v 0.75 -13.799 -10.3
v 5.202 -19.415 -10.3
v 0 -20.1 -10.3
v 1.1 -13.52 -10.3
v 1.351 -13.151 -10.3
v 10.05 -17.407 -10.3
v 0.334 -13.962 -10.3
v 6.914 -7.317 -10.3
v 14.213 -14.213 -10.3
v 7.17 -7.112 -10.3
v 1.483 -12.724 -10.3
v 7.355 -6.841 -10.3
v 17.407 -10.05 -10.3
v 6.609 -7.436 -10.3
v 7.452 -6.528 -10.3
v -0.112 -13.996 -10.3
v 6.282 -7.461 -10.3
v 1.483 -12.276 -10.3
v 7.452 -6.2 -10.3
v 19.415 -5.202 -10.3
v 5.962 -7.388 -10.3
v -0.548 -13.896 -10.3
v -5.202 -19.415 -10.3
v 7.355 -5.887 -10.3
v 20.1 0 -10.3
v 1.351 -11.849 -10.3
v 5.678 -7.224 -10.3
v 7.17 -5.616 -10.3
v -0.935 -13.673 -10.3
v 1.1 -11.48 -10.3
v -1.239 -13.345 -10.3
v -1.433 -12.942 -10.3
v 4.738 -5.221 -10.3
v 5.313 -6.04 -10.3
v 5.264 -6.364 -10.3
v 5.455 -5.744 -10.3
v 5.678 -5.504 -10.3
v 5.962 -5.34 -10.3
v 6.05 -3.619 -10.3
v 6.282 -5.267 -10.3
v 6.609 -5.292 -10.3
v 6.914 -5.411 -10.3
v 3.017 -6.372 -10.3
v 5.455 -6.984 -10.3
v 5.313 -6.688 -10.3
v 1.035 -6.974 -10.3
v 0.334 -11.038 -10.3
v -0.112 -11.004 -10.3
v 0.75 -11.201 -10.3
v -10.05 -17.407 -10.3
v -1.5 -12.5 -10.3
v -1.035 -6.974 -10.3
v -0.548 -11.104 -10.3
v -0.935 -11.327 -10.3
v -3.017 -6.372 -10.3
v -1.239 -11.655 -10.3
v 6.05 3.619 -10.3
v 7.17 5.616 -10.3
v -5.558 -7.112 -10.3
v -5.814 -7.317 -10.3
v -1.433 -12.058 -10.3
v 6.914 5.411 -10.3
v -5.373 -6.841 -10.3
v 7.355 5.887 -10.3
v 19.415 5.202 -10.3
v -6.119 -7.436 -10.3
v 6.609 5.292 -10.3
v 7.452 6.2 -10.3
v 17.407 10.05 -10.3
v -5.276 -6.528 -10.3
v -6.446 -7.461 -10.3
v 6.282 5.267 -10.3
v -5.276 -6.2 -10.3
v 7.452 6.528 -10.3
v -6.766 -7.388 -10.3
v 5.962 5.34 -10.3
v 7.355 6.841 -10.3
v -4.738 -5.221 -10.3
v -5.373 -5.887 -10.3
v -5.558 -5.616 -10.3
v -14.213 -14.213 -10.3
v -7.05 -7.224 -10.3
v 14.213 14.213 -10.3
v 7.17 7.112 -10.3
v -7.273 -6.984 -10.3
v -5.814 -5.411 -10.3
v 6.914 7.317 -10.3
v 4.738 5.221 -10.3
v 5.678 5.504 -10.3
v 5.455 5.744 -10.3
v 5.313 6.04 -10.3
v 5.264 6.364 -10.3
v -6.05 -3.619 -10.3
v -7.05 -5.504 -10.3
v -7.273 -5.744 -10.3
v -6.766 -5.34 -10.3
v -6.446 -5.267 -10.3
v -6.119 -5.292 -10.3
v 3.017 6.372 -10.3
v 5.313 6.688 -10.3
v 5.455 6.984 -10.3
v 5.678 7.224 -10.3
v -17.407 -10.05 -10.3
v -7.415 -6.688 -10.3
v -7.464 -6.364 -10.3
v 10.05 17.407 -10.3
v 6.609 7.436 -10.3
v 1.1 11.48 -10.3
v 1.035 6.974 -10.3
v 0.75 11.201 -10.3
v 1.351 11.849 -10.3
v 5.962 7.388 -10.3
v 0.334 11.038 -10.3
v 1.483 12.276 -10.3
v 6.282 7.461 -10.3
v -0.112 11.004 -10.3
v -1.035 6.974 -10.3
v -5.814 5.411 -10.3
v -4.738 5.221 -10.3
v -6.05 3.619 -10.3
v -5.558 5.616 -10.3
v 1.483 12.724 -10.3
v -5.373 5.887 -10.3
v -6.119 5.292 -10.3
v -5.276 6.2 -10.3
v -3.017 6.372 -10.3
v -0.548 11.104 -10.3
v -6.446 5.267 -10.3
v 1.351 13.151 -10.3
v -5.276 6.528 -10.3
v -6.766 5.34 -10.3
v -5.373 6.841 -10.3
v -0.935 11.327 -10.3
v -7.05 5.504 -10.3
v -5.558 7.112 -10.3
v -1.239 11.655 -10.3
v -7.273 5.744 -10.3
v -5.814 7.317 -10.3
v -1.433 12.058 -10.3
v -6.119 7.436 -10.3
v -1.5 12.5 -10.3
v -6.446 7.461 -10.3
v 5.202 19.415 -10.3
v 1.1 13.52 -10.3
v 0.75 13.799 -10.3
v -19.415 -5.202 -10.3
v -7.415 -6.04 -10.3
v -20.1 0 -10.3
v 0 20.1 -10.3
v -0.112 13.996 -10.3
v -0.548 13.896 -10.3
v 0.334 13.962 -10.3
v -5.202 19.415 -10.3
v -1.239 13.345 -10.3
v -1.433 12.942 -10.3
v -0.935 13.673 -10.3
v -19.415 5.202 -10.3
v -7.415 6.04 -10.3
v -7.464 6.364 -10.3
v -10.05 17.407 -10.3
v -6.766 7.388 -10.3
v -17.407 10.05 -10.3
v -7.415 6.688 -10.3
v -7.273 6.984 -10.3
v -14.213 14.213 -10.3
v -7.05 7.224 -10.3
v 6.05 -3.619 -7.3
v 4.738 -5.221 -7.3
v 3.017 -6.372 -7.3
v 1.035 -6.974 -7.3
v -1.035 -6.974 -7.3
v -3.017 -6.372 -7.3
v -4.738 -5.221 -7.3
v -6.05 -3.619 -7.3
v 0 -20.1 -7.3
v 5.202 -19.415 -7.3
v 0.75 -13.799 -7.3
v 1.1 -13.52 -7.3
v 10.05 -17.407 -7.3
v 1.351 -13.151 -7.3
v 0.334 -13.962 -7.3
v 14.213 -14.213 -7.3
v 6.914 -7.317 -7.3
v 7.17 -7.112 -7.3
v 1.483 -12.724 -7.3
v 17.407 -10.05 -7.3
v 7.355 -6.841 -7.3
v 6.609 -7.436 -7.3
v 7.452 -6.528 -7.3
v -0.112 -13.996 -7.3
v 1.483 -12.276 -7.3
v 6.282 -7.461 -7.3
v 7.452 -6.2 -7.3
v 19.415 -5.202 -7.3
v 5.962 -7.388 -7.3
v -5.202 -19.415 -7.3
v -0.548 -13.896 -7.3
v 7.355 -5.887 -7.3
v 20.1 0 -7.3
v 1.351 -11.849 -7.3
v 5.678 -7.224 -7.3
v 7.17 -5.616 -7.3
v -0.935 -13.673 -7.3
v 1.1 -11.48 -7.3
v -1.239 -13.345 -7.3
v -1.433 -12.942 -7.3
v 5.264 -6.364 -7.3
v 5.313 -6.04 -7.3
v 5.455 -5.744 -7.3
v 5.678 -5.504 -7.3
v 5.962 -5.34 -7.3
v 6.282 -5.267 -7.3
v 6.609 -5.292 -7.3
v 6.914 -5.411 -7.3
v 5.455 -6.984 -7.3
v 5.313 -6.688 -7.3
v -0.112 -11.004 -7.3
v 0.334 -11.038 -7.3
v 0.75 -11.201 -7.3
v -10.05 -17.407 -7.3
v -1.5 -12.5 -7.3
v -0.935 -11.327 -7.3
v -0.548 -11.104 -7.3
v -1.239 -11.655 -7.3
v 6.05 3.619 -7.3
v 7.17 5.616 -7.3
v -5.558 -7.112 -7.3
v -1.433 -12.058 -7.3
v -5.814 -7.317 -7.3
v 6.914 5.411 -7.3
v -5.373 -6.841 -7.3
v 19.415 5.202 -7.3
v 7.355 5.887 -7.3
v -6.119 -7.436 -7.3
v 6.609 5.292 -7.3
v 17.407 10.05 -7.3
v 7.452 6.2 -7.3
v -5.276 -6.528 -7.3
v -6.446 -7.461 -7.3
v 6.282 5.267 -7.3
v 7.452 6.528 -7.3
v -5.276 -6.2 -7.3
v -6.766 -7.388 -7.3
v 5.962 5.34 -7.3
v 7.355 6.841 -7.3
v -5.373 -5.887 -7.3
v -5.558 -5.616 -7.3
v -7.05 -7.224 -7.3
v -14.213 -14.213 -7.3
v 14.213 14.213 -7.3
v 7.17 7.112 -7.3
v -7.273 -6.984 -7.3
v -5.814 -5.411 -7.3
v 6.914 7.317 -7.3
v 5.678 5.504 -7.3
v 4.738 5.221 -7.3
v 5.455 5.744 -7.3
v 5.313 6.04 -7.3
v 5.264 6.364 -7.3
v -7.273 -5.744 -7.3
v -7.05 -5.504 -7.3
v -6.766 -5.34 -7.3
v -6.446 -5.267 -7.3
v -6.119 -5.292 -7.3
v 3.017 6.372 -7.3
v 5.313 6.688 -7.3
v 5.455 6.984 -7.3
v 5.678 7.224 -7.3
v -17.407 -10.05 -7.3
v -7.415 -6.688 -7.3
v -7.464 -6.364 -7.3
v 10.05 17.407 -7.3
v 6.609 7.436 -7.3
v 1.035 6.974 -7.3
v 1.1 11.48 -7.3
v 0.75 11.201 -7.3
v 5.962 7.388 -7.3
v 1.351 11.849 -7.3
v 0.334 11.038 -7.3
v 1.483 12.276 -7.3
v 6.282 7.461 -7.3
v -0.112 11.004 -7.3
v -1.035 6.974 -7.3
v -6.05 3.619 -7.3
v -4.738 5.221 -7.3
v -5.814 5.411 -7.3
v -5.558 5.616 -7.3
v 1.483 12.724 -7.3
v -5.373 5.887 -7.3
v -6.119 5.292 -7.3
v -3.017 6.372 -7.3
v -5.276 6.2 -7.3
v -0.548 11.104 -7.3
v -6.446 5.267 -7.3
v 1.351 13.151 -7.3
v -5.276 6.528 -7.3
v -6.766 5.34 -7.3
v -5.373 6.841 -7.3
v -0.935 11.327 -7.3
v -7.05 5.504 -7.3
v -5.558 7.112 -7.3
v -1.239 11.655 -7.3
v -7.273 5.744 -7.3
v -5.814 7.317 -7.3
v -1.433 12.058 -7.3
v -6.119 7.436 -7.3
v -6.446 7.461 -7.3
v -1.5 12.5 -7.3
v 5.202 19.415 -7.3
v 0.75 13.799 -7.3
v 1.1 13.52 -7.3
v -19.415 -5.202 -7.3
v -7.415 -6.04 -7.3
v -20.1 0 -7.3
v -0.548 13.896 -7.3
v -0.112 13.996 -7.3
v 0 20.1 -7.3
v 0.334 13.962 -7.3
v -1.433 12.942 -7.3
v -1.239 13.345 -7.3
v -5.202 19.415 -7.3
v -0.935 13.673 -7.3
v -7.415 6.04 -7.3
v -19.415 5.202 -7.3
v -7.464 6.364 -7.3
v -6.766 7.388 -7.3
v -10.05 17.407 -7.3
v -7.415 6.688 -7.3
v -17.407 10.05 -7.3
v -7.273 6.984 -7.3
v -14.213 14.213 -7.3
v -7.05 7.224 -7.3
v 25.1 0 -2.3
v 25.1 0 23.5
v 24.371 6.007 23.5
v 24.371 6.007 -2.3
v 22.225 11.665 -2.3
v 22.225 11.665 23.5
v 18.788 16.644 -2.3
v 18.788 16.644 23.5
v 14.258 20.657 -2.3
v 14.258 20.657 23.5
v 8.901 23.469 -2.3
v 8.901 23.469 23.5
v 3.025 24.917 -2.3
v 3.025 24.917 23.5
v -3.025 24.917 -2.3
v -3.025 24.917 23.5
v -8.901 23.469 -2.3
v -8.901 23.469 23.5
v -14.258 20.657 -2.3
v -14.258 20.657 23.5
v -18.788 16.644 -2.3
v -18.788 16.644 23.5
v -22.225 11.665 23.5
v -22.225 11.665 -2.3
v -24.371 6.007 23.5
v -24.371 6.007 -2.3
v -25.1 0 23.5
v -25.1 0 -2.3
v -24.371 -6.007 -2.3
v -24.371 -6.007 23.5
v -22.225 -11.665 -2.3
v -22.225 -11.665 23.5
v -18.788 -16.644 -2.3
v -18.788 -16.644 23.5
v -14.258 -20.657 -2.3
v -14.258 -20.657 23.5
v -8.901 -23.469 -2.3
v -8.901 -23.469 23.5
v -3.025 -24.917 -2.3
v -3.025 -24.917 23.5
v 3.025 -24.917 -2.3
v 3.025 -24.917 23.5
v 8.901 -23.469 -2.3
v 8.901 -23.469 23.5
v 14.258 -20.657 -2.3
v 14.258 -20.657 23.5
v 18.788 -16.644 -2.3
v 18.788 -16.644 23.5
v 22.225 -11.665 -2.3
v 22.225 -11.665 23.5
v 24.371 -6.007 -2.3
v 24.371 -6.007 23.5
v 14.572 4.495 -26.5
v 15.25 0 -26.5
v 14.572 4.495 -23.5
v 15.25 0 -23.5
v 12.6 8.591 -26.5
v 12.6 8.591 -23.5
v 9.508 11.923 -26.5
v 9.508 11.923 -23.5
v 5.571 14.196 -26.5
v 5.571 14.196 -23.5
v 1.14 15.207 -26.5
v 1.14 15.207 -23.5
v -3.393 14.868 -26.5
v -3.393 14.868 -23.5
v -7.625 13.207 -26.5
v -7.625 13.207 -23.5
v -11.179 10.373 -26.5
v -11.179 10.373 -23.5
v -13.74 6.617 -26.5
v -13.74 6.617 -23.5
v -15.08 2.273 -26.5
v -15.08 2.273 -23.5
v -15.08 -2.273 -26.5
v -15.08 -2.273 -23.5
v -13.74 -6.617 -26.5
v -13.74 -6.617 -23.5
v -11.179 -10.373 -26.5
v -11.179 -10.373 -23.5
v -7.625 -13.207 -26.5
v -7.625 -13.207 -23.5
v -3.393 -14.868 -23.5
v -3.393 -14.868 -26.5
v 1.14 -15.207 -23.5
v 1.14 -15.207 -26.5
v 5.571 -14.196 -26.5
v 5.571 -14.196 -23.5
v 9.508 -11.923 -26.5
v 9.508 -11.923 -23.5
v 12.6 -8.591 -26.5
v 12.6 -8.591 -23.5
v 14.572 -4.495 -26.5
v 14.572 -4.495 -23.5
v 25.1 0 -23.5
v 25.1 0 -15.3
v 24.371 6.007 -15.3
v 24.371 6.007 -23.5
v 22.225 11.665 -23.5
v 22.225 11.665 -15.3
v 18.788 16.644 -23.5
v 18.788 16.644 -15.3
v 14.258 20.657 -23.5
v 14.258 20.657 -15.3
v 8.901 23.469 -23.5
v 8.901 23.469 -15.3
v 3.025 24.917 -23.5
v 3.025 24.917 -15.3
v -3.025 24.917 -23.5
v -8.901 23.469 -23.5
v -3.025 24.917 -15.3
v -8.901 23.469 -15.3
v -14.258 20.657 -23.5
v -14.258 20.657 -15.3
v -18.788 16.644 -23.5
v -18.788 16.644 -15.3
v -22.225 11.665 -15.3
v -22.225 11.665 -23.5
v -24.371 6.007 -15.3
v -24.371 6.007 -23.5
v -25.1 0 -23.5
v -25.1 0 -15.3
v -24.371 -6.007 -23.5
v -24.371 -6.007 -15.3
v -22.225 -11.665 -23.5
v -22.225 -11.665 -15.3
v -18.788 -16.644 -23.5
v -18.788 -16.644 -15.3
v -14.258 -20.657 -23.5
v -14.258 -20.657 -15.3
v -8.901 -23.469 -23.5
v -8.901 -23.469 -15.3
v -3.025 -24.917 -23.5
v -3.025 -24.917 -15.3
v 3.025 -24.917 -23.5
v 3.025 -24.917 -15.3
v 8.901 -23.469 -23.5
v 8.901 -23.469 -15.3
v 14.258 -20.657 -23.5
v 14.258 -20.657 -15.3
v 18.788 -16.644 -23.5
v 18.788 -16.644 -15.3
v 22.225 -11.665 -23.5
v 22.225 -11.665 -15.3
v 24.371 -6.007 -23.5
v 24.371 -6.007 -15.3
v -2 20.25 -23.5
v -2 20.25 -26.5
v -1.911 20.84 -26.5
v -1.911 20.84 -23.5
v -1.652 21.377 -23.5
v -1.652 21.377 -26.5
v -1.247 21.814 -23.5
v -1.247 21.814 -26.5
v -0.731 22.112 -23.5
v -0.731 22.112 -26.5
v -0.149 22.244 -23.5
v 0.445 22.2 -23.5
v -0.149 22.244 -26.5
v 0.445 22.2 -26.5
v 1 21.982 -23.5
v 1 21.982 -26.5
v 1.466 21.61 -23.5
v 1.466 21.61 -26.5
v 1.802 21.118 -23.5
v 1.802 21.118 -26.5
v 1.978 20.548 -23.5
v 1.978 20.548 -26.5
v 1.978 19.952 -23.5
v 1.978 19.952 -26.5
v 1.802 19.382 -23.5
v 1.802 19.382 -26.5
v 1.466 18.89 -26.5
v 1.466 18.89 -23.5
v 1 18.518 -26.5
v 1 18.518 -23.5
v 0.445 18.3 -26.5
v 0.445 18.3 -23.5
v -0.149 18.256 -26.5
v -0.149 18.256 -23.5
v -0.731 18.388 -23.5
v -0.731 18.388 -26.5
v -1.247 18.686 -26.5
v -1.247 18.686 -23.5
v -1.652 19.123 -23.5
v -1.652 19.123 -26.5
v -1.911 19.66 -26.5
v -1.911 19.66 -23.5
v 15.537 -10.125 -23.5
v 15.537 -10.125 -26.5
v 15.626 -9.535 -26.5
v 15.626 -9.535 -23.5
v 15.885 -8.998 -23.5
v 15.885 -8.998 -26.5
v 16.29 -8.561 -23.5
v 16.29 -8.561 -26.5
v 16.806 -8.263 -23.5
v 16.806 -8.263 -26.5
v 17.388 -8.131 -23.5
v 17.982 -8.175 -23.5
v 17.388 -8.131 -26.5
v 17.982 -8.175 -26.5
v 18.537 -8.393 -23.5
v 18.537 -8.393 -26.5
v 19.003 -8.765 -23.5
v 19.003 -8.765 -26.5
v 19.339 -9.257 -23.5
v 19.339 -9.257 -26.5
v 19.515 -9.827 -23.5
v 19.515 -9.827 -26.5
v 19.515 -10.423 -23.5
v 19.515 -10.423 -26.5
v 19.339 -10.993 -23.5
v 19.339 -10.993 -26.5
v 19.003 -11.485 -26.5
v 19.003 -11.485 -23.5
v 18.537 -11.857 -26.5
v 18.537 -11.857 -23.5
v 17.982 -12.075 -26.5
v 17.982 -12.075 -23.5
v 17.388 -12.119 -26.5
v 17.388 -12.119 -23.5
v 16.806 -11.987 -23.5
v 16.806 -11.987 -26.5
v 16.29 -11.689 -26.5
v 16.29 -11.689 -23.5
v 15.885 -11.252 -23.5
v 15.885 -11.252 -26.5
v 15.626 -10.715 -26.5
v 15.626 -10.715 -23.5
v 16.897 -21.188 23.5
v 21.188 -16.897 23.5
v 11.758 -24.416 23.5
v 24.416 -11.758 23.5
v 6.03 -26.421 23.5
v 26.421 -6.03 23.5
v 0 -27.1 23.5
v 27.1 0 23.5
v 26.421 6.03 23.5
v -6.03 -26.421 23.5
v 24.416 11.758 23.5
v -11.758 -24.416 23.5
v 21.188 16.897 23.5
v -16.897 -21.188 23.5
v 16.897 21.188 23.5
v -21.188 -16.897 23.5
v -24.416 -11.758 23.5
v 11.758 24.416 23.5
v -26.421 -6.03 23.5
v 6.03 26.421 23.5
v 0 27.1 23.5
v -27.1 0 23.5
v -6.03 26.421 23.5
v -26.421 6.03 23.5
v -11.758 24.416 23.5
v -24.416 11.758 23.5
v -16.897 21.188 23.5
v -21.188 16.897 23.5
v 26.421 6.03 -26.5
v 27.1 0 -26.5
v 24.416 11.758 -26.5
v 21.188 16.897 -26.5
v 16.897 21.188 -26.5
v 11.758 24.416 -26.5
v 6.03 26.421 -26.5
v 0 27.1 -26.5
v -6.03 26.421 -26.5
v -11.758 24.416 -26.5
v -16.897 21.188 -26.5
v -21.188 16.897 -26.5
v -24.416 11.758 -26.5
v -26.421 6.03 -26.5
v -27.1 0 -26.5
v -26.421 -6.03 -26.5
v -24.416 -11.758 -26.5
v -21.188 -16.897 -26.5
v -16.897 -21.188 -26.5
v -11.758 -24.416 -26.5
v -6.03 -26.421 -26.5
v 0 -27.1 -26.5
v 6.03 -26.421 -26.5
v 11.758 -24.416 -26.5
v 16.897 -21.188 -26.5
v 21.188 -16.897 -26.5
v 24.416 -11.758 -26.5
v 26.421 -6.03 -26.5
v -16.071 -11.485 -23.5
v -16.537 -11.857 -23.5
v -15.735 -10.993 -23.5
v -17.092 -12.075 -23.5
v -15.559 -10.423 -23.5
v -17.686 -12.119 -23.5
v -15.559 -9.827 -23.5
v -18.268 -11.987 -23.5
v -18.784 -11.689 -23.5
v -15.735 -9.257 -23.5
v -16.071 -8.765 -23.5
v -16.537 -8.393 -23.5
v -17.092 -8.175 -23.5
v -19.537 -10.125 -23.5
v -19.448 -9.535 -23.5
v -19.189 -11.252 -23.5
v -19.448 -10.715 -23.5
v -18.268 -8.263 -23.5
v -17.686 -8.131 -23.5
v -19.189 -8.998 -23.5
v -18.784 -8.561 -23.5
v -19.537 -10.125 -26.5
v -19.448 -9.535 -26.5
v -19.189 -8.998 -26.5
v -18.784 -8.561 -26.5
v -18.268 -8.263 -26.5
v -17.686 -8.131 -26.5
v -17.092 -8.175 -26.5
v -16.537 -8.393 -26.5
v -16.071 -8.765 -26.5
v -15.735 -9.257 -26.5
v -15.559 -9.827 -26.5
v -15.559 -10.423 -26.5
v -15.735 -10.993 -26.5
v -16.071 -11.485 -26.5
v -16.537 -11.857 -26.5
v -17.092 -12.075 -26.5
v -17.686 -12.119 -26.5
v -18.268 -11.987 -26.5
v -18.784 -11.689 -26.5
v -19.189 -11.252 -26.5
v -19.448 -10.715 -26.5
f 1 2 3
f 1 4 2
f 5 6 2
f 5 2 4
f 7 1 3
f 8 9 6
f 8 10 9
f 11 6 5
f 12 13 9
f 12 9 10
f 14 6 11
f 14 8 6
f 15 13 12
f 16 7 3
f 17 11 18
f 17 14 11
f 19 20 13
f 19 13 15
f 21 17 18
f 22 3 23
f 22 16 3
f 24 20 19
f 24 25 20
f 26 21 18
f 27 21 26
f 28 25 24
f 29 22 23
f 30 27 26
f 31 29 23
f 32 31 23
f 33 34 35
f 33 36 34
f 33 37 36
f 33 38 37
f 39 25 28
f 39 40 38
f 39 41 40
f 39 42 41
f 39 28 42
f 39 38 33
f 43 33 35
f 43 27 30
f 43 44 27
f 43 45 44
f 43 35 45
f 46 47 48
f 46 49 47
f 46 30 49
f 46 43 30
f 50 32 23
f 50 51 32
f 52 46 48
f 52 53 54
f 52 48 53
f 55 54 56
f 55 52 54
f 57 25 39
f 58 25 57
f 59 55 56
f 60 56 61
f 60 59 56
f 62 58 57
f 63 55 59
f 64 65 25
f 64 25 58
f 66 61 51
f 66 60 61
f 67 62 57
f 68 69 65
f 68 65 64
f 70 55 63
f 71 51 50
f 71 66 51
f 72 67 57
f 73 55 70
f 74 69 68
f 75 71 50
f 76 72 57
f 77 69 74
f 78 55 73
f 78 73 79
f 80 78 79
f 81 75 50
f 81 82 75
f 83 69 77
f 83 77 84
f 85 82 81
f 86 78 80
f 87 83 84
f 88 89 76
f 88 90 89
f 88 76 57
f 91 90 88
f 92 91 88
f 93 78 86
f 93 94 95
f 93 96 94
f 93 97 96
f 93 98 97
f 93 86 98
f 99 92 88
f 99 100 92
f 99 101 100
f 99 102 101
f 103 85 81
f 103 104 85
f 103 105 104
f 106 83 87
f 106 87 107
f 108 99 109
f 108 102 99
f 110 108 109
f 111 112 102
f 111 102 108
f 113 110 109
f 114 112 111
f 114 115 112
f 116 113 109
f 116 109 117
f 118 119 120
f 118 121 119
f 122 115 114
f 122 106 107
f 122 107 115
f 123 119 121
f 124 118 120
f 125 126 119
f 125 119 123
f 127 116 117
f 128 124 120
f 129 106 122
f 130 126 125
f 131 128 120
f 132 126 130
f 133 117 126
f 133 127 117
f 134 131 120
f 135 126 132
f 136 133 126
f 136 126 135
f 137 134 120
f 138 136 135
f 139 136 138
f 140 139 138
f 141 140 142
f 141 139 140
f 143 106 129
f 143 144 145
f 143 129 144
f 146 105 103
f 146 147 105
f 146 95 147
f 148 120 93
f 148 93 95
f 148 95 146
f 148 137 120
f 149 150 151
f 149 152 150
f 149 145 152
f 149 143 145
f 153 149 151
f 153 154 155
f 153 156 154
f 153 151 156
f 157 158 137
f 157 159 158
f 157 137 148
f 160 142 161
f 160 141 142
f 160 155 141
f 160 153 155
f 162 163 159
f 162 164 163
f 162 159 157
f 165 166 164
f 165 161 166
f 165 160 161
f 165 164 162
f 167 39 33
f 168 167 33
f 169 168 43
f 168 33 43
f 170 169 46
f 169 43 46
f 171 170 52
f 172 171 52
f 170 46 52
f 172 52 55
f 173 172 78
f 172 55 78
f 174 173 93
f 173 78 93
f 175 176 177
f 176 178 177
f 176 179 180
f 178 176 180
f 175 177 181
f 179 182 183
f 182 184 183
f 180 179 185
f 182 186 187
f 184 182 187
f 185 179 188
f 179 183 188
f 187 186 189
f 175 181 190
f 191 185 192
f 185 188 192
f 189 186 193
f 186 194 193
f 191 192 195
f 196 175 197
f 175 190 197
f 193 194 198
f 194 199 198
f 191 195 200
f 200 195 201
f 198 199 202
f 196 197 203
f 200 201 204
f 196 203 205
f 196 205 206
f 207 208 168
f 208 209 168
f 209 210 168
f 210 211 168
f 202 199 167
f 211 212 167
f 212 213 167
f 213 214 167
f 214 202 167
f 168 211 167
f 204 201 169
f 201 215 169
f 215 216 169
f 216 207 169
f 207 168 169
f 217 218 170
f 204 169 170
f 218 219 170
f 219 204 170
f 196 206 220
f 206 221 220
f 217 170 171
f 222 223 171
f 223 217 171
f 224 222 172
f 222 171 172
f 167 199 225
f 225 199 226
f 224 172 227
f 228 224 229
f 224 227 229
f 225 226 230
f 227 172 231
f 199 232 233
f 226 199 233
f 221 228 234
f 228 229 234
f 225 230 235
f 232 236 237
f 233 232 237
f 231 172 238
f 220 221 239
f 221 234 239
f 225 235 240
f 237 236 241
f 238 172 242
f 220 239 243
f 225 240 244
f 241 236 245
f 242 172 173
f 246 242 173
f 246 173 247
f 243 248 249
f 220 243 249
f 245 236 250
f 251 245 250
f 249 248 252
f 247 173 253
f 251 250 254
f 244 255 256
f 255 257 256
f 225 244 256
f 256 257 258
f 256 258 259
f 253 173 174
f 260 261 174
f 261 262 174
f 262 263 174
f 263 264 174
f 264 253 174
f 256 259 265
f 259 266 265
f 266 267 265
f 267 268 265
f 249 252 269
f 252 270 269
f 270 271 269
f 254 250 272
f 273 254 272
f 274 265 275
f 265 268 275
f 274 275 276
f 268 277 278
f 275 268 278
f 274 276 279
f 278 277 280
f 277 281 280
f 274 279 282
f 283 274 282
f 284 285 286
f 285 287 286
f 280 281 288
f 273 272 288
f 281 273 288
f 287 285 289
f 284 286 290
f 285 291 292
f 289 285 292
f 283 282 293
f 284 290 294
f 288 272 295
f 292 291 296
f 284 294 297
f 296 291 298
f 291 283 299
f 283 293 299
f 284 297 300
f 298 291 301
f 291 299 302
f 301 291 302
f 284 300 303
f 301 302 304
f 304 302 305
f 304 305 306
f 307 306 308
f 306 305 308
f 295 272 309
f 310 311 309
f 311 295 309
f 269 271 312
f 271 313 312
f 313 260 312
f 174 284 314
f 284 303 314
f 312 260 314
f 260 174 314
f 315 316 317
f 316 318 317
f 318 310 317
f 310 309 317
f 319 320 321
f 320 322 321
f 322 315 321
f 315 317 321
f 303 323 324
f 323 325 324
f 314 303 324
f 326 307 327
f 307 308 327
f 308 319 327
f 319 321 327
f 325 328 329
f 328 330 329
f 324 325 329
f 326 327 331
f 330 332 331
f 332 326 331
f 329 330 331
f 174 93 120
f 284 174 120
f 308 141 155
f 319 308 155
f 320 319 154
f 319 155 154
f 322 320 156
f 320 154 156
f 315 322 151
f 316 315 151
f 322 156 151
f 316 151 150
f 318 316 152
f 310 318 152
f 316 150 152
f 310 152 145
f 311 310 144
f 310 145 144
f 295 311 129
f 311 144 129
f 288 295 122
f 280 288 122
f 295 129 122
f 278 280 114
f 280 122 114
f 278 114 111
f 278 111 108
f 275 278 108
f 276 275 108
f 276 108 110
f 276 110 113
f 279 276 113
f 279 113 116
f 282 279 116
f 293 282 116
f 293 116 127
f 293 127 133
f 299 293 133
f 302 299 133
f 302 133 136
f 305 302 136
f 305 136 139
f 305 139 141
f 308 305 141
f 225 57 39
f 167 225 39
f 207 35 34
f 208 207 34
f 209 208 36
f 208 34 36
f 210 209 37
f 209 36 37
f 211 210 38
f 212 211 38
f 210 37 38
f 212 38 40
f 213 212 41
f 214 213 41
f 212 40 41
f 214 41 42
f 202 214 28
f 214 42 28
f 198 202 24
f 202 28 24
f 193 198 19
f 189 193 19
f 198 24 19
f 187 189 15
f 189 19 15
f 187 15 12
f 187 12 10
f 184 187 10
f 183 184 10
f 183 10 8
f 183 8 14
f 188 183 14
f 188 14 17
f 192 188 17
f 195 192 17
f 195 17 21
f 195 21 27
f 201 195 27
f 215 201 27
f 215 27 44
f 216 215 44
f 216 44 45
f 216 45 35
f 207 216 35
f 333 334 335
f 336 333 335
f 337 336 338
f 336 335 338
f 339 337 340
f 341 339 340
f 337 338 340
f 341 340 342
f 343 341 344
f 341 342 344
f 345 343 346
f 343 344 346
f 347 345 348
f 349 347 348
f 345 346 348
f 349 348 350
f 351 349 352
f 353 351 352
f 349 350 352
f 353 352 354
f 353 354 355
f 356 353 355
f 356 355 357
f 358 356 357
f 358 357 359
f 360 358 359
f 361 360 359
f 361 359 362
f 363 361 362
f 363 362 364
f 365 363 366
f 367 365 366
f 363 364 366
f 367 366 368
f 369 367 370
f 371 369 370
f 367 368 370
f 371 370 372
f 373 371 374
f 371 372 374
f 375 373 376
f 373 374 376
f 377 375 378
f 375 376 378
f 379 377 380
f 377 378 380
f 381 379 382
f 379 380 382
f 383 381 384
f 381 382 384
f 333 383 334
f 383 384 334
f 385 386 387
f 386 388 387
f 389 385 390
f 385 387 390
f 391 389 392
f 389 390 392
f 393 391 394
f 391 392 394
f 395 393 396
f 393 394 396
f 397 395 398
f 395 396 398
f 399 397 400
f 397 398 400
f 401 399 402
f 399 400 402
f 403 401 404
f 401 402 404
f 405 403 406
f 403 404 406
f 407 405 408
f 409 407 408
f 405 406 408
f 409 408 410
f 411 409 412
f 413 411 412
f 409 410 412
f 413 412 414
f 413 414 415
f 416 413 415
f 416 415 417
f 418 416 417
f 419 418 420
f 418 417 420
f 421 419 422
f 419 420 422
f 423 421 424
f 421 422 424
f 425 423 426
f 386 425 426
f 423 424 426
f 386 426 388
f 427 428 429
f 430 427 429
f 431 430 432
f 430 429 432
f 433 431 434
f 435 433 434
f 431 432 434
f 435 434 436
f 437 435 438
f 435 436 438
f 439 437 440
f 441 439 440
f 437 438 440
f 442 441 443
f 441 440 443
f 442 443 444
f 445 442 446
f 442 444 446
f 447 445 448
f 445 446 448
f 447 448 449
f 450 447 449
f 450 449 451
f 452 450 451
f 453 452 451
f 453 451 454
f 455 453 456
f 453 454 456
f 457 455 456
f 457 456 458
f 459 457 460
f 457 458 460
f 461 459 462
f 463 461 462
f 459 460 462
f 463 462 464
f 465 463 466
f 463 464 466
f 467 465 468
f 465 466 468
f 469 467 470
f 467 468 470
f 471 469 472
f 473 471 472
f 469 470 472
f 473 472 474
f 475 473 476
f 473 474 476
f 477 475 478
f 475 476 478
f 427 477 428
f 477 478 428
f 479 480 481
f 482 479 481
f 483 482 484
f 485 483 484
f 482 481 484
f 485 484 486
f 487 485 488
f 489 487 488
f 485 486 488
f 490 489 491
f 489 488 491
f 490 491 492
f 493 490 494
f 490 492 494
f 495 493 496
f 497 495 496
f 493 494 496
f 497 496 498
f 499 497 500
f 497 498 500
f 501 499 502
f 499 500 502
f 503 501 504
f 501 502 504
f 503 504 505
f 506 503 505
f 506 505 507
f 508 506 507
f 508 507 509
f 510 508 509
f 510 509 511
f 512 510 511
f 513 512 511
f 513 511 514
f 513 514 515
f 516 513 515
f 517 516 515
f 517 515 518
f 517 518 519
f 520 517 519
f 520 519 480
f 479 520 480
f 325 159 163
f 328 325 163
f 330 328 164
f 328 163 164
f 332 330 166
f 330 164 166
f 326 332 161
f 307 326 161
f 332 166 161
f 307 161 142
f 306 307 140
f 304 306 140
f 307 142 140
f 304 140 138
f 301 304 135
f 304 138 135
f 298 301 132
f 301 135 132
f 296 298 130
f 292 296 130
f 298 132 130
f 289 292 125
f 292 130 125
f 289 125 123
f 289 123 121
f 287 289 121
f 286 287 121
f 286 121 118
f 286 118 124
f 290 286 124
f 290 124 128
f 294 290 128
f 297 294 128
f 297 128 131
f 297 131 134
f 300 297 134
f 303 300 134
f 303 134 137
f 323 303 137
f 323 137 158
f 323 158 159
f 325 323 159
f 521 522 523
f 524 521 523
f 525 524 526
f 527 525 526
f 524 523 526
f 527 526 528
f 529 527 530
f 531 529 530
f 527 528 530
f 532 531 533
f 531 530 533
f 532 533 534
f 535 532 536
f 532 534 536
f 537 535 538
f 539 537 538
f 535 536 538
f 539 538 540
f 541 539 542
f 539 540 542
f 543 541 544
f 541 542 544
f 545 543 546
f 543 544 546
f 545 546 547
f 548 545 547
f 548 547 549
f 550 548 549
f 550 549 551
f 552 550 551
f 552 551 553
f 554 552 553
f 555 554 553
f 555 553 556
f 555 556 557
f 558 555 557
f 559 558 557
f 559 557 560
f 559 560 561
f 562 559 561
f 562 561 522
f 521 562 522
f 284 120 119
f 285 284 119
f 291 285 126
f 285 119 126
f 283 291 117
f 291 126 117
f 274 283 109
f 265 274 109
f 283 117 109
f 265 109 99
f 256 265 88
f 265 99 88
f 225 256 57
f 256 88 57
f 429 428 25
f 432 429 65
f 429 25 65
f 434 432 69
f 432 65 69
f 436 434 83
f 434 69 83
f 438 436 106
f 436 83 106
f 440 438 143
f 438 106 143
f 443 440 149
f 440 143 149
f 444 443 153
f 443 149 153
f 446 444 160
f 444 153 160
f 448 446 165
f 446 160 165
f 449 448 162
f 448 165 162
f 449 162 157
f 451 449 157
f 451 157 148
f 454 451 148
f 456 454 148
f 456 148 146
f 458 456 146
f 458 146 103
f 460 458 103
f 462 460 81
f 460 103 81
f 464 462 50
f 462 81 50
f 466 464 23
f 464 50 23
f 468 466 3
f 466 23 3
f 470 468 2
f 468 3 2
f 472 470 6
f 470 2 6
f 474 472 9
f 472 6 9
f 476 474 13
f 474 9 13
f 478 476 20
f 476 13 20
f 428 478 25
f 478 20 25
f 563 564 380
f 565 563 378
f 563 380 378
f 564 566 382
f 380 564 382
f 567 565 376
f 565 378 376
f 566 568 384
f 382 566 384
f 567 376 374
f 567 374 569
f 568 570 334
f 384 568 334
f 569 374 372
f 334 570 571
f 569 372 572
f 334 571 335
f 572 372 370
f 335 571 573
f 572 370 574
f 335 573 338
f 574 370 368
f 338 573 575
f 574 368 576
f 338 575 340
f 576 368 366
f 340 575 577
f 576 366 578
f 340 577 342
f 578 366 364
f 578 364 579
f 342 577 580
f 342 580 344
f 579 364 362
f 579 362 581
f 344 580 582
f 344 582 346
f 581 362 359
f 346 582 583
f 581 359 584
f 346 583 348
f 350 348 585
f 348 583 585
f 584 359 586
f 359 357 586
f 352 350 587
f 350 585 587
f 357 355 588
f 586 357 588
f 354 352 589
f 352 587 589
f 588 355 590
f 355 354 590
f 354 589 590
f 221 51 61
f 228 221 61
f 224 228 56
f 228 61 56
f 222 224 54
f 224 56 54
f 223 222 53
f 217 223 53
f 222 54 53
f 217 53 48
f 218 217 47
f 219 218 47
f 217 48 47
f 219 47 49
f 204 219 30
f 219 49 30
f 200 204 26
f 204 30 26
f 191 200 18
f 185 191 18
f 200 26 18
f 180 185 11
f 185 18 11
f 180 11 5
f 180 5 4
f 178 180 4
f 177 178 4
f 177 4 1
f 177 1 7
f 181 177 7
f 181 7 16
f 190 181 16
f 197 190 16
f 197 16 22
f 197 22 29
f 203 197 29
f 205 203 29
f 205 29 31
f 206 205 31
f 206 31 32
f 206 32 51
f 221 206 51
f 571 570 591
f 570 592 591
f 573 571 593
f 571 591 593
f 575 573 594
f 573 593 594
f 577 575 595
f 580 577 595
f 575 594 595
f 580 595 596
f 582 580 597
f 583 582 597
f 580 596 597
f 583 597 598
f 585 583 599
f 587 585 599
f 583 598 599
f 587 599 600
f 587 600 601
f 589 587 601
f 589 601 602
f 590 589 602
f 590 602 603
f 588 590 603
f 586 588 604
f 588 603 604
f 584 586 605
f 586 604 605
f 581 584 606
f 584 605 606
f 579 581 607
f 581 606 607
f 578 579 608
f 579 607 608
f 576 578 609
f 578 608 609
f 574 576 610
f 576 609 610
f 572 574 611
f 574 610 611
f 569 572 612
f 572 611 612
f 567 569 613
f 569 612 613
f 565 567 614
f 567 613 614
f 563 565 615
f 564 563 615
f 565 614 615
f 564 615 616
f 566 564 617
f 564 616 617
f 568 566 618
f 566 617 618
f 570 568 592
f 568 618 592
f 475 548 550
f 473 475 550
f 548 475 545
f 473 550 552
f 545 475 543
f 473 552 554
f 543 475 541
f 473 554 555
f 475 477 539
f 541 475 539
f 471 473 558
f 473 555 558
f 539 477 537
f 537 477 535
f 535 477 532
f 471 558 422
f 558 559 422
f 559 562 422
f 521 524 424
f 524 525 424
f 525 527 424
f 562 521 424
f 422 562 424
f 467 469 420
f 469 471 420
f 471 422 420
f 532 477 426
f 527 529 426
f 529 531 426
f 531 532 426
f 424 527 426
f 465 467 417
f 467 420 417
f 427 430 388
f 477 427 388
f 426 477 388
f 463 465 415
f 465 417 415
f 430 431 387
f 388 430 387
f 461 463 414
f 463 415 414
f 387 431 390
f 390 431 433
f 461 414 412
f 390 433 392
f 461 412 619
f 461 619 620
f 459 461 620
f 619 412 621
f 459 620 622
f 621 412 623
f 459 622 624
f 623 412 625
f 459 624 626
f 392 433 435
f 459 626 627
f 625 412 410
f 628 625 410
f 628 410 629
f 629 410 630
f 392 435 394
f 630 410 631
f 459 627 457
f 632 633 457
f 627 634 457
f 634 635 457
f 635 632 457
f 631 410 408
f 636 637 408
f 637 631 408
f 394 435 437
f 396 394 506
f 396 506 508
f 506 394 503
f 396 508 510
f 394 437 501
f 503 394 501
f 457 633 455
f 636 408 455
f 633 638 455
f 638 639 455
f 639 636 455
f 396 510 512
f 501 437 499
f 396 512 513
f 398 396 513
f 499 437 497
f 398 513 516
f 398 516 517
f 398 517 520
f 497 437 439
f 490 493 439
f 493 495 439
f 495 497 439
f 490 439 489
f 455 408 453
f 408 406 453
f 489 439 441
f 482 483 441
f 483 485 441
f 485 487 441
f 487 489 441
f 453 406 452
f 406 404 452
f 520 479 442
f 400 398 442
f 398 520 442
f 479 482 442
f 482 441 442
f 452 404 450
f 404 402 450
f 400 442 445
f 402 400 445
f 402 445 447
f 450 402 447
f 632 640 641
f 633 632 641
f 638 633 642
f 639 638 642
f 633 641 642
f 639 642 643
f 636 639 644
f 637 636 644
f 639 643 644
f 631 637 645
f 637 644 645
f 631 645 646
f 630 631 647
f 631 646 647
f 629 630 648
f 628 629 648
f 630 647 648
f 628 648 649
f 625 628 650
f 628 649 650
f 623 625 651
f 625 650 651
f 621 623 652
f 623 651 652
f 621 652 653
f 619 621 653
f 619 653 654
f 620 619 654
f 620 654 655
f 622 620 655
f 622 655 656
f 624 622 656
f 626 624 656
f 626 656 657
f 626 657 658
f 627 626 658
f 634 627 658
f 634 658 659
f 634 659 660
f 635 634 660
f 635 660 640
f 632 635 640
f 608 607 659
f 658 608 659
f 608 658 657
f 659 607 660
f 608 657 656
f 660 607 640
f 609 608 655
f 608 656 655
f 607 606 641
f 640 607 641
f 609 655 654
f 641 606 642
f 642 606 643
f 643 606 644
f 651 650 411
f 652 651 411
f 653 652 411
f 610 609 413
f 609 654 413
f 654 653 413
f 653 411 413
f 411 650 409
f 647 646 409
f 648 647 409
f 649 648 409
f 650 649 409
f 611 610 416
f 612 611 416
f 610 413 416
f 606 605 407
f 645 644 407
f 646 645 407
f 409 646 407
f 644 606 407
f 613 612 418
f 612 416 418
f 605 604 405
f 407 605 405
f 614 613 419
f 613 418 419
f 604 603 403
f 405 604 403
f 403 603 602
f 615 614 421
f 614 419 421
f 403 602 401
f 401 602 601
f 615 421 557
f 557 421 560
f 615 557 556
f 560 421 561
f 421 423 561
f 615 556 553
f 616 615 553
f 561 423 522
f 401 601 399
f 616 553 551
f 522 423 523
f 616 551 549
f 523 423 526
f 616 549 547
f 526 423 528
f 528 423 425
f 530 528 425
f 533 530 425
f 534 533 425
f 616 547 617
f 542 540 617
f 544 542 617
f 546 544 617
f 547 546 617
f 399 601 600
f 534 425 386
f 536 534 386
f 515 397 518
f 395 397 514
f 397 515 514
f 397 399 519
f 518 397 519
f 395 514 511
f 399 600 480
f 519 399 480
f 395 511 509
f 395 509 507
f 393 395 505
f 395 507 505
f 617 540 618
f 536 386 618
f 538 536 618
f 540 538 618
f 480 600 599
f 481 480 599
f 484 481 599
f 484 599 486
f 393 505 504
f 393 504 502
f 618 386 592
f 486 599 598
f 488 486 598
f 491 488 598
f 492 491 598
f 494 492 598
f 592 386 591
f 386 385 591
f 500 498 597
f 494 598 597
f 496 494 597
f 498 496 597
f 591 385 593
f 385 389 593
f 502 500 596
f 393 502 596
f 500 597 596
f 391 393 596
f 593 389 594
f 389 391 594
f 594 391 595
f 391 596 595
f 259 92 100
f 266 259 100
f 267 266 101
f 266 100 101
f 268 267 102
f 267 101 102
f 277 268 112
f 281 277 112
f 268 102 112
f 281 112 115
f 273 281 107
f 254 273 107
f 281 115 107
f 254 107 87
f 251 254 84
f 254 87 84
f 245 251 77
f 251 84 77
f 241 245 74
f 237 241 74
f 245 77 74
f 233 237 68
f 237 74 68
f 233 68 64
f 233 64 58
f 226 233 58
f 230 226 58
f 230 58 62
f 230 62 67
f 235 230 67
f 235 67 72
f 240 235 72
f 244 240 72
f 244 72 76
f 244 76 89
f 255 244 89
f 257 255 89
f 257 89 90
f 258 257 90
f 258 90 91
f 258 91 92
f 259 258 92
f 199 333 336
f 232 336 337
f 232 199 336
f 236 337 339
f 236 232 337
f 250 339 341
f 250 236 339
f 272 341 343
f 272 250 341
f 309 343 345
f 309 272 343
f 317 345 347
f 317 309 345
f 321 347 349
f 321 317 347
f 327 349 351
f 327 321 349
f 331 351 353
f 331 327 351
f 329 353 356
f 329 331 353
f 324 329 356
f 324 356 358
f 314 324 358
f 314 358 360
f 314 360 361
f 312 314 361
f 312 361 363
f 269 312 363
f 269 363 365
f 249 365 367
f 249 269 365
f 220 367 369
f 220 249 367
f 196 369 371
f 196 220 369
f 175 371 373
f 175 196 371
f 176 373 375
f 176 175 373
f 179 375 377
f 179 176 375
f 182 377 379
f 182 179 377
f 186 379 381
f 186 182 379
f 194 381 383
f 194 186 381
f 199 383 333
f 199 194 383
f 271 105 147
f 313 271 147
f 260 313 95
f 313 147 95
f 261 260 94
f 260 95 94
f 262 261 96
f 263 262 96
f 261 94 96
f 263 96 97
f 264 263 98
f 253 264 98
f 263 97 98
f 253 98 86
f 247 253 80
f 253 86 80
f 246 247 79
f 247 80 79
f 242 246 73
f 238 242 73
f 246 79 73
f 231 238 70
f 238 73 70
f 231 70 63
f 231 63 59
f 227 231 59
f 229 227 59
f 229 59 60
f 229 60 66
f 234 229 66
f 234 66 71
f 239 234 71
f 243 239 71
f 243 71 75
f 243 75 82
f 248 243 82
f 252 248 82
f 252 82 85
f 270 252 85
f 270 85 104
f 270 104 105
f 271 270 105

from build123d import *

# Parameters (mm, degrees)
SKETCH2_R          = 2
CUT_EXTRUDE1_DEPTH = 10
SKETCH3_W          = 25.1
SKETCH3_H          = 3
CHAMFER1_SIZE      = 5
SKETCH4_R          = 1.1
SKETCH4_R_2        = 1.5
CUT_EXTRUDE2_DEPTH = 10


with BuildPart() as part:
    # Sketch1 → Revolve1 (revolve)
    with BuildSketch(Plane(origin=(0, 0, 0), x_dir=(1, 0, 0), z_dir=(0, 1, 0))):
        Polygon((15.25, 26.5), (15.25, 23.5), (25.1, 23.5), (25.1, -23.5), (27.1, -23.5), (27.1, 26.5), align=None)
    revolve(axis=Axis((0, 0, -51.288157895), (0, 0, 1)))

    # Sketch2 → Cut-Extrude1 (cut)
    with BuildSketch(Plane(origin=(0, 0, -26.5), x_dir=(-1, 0, 0), z_dir=(0, 0, -1))):
        with Locations((0, 20.25)):
            Circle(SKETCH2_R)
        with Locations((17.537014427, -10.125)):
            Circle(SKETCH2_R)
        with Locations((-17.537014427, -10.125)):
            Circle(SKETCH2_R)
    extrude(amount=-CUT_EXTRUDE1_DEPTH, mode=Mode.SUBTRACT)

    # Sketch3 → Revolve2 (revolve)
    with BuildSketch(Plane(origin=(0, 0, 0), x_dir=(1, 0, 0), z_dir=(0, 1, 0))):
        with Locations((12.55, 8.8)):
            Rectangle(SKETCH3_W, SKETCH3_H)
    revolve(axis=Axis((0, 0, -51.288157895), (0, 0, 1)))

    # Chamfer1
    chamfer1_edges = [part.edges().sort_by_distance(p)[0] for p in [
        (-25.1, 0, -7.3),
        (-25.1, 0, -10.3),
    ]]
    chamfer(chamfer1_edges, length=CHAMFER1_SIZE)

    # Sketch4 → Cut-Extrude2 (cut)
    with BuildSketch(Plane(origin=(0, 0, -10.3), x_dir=(-1, 0, 0), z_dir=(0, 0, -1))):
        with Locations((-6.363961031, 6.363961031)):
            Circle(SKETCH4_R)
        with Locations((6.363961031, 6.363961031)):
            Circle(SKETCH4_R)
        with Locations((6.363961031, -6.363961031)):
            Circle(SKETCH4_R)
        with Locations((-6.363961031, -6.363961031)):
            Circle(SKETCH4_R)
        with Locations((0, 12.5)):
            Circle(SKETCH4_R_2)
        with Locations((0, -12.5)):
            Circle(SKETCH4_R_2)
        with BuildLine():
            Line((-6.05, 3.619392214), (-6.05, -3.619392214))
            ThreePointArc((-6.05, -3.619392214), (0, -7.05), (6.05, -3.619392214))
            Line((6.05, -3.619392214), (6.05, 3.619392214))
            ThreePointArc((6.05, 3.619392214), (0, 7.05), (-6.05, 3.619392214))
        make_face()
    extrude(amount=-CUT_EXTRUDE2_DEPTH, mode=Mode.SUBTRACT)


solid = part.part
